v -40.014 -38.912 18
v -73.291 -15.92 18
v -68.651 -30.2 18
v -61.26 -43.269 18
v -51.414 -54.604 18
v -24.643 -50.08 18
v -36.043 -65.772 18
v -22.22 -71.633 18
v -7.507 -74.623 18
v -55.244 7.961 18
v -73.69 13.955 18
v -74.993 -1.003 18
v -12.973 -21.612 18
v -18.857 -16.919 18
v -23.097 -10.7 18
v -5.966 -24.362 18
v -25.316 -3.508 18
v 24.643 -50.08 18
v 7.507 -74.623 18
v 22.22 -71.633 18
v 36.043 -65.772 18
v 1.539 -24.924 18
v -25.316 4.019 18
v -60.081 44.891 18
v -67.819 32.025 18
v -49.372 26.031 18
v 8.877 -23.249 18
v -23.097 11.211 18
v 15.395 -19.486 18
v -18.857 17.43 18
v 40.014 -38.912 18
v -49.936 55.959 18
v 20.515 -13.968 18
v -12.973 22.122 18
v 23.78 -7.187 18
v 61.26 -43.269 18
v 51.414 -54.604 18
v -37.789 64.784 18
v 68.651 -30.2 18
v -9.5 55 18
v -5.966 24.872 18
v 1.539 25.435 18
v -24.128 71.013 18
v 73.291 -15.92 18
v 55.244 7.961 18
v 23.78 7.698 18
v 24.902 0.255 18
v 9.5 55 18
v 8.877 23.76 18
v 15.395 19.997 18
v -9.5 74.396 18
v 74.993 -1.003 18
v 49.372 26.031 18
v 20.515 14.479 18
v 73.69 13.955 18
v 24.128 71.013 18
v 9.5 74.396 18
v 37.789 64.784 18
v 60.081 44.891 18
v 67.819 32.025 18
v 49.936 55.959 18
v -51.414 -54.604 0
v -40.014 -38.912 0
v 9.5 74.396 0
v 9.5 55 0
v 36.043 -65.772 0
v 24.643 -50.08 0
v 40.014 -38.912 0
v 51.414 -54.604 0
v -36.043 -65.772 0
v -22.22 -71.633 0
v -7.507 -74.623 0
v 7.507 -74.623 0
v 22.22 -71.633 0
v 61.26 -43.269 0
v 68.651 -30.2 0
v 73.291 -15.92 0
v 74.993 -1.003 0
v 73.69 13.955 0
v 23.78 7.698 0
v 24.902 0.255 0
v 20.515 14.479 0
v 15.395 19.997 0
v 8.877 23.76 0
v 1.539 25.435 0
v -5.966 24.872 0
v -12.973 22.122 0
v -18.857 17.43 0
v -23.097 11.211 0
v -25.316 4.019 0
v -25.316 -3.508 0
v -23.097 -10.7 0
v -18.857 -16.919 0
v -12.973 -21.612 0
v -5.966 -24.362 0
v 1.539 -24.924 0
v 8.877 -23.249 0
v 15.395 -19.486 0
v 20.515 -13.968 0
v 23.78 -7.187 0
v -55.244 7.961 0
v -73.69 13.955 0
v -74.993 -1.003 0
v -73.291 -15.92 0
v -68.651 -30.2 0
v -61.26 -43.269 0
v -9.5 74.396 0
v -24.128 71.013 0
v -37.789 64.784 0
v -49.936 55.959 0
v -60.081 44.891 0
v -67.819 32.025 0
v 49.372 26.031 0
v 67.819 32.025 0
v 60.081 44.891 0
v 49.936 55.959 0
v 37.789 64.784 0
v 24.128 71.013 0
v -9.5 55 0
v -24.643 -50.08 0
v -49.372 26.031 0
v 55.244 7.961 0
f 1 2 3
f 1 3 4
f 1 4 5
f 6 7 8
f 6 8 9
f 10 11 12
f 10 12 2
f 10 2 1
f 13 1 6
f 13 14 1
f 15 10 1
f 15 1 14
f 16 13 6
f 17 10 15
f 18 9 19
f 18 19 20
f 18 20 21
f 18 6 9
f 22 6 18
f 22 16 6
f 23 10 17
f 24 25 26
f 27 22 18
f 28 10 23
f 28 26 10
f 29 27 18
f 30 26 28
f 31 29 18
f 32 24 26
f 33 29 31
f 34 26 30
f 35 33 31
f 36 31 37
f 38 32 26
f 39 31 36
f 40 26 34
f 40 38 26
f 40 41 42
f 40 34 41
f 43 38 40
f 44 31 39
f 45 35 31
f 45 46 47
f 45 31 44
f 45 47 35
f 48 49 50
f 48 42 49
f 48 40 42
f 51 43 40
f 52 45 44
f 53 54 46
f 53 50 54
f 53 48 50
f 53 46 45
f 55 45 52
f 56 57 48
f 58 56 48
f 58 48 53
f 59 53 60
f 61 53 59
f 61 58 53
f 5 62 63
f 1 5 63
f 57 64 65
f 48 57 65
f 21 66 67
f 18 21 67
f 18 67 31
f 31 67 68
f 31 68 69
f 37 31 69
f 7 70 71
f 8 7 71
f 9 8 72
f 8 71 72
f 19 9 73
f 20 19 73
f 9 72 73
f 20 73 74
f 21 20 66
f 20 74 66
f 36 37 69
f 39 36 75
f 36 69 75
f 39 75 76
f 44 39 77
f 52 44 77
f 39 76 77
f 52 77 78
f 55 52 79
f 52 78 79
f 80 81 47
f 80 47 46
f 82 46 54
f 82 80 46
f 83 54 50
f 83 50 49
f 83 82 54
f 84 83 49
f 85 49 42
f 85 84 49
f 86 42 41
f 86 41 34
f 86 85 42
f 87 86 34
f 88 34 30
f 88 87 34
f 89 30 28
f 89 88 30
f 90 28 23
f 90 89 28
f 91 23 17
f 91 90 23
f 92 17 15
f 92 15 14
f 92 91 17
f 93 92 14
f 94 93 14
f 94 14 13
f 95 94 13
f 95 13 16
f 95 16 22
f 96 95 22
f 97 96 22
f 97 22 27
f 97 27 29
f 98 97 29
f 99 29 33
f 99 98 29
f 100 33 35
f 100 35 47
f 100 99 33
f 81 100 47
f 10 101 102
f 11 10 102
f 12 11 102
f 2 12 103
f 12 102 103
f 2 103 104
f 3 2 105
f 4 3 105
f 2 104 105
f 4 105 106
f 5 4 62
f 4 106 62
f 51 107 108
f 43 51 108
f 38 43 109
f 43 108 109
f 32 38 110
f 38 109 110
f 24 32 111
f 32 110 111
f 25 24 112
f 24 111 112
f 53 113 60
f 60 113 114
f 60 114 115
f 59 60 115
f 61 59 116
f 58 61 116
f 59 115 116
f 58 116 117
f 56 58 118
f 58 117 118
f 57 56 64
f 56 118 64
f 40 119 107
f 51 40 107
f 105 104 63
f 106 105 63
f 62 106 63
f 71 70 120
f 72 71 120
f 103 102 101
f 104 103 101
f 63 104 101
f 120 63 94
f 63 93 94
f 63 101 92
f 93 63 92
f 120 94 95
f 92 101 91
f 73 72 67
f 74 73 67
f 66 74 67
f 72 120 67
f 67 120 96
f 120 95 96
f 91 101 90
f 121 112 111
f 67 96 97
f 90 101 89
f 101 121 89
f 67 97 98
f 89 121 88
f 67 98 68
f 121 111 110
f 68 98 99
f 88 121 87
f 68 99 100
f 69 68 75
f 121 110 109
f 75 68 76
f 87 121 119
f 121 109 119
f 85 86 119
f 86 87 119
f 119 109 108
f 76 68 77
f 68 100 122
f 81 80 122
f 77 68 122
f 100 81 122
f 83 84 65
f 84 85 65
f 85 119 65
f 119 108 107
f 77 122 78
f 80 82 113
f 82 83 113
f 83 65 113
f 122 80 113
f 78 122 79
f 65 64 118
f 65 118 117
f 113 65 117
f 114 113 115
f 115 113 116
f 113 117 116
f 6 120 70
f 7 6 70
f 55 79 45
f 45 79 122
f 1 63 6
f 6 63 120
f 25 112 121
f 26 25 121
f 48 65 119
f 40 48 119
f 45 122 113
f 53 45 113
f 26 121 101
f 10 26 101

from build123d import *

# Parameters (mm, degrees)
F0_R     = 25.25
F1_DEPTH = 18


with BuildPart() as f1:
    # F0 (on Top) → F1 (new body)
    with BuildSketch(Plane.XY):
        with BuildLine():
            Line((-9.5, 55), (-9.5, 74.3959))
            ThreePointArc((-9.5, 74.3959), (-44.083894, 60.676275), (-67.819044, 32.024634))
            Line((-67.819044, 32.024634), (-49.372447, 26.030972))
            Line((-49.372447, 26.030972), (-55.24377, 7.960898))
            Line((-55.24377, 7.960898), (-73.690367, 13.954561))
            ThreePointArc((-73.690367, 13.954561), (-71.329239, -23.176275), (-51.414475, -54.603588))
            Line((-51.414475, -54.603588), (-40.01385, -38.911975))
            Line((-40.01385, -38.911975), (-24.642527, -50.079895))
            Line((-24.642527, -50.079895), (-36.043152, -65.771508))
            ThreePointArc((-36.043152, -65.771508), (0, -75), (36.043152, -65.771508))
            Line((36.043152, -65.771508), (24.642527, -50.079895))
            Line((24.642527, -50.079895), (40.01385, -38.911975))
            Line((40.01385, -38.911975), (51.414475, -54.603588))
            ThreePointArc((51.414475, -54.603588), (71.329239, -23.176275), (73.690367, 13.954561))
            Line((73.690367, 13.954561), (55.24377, 7.960898))
            Line((55.24377, 7.960898), (49.372447, 26.030972))
            Line((49.372447, 26.030972), (67.819044, 32.024634))
            ThreePointArc((67.819044, 32.024634), (44.083894, 60.676275), (9.5, 74.3959))
            Line((9.5, 74.3959), (9.5, 55))
            Line((9.5, 55), (-9.5, 55))
        make_face()
        with Locations((-0.347831, 0.255336)):
            Circle(F0_R, mode=Mode.SUBTRACT)
    extrude(amount=F1_DEPTH)


solid = f1.part
